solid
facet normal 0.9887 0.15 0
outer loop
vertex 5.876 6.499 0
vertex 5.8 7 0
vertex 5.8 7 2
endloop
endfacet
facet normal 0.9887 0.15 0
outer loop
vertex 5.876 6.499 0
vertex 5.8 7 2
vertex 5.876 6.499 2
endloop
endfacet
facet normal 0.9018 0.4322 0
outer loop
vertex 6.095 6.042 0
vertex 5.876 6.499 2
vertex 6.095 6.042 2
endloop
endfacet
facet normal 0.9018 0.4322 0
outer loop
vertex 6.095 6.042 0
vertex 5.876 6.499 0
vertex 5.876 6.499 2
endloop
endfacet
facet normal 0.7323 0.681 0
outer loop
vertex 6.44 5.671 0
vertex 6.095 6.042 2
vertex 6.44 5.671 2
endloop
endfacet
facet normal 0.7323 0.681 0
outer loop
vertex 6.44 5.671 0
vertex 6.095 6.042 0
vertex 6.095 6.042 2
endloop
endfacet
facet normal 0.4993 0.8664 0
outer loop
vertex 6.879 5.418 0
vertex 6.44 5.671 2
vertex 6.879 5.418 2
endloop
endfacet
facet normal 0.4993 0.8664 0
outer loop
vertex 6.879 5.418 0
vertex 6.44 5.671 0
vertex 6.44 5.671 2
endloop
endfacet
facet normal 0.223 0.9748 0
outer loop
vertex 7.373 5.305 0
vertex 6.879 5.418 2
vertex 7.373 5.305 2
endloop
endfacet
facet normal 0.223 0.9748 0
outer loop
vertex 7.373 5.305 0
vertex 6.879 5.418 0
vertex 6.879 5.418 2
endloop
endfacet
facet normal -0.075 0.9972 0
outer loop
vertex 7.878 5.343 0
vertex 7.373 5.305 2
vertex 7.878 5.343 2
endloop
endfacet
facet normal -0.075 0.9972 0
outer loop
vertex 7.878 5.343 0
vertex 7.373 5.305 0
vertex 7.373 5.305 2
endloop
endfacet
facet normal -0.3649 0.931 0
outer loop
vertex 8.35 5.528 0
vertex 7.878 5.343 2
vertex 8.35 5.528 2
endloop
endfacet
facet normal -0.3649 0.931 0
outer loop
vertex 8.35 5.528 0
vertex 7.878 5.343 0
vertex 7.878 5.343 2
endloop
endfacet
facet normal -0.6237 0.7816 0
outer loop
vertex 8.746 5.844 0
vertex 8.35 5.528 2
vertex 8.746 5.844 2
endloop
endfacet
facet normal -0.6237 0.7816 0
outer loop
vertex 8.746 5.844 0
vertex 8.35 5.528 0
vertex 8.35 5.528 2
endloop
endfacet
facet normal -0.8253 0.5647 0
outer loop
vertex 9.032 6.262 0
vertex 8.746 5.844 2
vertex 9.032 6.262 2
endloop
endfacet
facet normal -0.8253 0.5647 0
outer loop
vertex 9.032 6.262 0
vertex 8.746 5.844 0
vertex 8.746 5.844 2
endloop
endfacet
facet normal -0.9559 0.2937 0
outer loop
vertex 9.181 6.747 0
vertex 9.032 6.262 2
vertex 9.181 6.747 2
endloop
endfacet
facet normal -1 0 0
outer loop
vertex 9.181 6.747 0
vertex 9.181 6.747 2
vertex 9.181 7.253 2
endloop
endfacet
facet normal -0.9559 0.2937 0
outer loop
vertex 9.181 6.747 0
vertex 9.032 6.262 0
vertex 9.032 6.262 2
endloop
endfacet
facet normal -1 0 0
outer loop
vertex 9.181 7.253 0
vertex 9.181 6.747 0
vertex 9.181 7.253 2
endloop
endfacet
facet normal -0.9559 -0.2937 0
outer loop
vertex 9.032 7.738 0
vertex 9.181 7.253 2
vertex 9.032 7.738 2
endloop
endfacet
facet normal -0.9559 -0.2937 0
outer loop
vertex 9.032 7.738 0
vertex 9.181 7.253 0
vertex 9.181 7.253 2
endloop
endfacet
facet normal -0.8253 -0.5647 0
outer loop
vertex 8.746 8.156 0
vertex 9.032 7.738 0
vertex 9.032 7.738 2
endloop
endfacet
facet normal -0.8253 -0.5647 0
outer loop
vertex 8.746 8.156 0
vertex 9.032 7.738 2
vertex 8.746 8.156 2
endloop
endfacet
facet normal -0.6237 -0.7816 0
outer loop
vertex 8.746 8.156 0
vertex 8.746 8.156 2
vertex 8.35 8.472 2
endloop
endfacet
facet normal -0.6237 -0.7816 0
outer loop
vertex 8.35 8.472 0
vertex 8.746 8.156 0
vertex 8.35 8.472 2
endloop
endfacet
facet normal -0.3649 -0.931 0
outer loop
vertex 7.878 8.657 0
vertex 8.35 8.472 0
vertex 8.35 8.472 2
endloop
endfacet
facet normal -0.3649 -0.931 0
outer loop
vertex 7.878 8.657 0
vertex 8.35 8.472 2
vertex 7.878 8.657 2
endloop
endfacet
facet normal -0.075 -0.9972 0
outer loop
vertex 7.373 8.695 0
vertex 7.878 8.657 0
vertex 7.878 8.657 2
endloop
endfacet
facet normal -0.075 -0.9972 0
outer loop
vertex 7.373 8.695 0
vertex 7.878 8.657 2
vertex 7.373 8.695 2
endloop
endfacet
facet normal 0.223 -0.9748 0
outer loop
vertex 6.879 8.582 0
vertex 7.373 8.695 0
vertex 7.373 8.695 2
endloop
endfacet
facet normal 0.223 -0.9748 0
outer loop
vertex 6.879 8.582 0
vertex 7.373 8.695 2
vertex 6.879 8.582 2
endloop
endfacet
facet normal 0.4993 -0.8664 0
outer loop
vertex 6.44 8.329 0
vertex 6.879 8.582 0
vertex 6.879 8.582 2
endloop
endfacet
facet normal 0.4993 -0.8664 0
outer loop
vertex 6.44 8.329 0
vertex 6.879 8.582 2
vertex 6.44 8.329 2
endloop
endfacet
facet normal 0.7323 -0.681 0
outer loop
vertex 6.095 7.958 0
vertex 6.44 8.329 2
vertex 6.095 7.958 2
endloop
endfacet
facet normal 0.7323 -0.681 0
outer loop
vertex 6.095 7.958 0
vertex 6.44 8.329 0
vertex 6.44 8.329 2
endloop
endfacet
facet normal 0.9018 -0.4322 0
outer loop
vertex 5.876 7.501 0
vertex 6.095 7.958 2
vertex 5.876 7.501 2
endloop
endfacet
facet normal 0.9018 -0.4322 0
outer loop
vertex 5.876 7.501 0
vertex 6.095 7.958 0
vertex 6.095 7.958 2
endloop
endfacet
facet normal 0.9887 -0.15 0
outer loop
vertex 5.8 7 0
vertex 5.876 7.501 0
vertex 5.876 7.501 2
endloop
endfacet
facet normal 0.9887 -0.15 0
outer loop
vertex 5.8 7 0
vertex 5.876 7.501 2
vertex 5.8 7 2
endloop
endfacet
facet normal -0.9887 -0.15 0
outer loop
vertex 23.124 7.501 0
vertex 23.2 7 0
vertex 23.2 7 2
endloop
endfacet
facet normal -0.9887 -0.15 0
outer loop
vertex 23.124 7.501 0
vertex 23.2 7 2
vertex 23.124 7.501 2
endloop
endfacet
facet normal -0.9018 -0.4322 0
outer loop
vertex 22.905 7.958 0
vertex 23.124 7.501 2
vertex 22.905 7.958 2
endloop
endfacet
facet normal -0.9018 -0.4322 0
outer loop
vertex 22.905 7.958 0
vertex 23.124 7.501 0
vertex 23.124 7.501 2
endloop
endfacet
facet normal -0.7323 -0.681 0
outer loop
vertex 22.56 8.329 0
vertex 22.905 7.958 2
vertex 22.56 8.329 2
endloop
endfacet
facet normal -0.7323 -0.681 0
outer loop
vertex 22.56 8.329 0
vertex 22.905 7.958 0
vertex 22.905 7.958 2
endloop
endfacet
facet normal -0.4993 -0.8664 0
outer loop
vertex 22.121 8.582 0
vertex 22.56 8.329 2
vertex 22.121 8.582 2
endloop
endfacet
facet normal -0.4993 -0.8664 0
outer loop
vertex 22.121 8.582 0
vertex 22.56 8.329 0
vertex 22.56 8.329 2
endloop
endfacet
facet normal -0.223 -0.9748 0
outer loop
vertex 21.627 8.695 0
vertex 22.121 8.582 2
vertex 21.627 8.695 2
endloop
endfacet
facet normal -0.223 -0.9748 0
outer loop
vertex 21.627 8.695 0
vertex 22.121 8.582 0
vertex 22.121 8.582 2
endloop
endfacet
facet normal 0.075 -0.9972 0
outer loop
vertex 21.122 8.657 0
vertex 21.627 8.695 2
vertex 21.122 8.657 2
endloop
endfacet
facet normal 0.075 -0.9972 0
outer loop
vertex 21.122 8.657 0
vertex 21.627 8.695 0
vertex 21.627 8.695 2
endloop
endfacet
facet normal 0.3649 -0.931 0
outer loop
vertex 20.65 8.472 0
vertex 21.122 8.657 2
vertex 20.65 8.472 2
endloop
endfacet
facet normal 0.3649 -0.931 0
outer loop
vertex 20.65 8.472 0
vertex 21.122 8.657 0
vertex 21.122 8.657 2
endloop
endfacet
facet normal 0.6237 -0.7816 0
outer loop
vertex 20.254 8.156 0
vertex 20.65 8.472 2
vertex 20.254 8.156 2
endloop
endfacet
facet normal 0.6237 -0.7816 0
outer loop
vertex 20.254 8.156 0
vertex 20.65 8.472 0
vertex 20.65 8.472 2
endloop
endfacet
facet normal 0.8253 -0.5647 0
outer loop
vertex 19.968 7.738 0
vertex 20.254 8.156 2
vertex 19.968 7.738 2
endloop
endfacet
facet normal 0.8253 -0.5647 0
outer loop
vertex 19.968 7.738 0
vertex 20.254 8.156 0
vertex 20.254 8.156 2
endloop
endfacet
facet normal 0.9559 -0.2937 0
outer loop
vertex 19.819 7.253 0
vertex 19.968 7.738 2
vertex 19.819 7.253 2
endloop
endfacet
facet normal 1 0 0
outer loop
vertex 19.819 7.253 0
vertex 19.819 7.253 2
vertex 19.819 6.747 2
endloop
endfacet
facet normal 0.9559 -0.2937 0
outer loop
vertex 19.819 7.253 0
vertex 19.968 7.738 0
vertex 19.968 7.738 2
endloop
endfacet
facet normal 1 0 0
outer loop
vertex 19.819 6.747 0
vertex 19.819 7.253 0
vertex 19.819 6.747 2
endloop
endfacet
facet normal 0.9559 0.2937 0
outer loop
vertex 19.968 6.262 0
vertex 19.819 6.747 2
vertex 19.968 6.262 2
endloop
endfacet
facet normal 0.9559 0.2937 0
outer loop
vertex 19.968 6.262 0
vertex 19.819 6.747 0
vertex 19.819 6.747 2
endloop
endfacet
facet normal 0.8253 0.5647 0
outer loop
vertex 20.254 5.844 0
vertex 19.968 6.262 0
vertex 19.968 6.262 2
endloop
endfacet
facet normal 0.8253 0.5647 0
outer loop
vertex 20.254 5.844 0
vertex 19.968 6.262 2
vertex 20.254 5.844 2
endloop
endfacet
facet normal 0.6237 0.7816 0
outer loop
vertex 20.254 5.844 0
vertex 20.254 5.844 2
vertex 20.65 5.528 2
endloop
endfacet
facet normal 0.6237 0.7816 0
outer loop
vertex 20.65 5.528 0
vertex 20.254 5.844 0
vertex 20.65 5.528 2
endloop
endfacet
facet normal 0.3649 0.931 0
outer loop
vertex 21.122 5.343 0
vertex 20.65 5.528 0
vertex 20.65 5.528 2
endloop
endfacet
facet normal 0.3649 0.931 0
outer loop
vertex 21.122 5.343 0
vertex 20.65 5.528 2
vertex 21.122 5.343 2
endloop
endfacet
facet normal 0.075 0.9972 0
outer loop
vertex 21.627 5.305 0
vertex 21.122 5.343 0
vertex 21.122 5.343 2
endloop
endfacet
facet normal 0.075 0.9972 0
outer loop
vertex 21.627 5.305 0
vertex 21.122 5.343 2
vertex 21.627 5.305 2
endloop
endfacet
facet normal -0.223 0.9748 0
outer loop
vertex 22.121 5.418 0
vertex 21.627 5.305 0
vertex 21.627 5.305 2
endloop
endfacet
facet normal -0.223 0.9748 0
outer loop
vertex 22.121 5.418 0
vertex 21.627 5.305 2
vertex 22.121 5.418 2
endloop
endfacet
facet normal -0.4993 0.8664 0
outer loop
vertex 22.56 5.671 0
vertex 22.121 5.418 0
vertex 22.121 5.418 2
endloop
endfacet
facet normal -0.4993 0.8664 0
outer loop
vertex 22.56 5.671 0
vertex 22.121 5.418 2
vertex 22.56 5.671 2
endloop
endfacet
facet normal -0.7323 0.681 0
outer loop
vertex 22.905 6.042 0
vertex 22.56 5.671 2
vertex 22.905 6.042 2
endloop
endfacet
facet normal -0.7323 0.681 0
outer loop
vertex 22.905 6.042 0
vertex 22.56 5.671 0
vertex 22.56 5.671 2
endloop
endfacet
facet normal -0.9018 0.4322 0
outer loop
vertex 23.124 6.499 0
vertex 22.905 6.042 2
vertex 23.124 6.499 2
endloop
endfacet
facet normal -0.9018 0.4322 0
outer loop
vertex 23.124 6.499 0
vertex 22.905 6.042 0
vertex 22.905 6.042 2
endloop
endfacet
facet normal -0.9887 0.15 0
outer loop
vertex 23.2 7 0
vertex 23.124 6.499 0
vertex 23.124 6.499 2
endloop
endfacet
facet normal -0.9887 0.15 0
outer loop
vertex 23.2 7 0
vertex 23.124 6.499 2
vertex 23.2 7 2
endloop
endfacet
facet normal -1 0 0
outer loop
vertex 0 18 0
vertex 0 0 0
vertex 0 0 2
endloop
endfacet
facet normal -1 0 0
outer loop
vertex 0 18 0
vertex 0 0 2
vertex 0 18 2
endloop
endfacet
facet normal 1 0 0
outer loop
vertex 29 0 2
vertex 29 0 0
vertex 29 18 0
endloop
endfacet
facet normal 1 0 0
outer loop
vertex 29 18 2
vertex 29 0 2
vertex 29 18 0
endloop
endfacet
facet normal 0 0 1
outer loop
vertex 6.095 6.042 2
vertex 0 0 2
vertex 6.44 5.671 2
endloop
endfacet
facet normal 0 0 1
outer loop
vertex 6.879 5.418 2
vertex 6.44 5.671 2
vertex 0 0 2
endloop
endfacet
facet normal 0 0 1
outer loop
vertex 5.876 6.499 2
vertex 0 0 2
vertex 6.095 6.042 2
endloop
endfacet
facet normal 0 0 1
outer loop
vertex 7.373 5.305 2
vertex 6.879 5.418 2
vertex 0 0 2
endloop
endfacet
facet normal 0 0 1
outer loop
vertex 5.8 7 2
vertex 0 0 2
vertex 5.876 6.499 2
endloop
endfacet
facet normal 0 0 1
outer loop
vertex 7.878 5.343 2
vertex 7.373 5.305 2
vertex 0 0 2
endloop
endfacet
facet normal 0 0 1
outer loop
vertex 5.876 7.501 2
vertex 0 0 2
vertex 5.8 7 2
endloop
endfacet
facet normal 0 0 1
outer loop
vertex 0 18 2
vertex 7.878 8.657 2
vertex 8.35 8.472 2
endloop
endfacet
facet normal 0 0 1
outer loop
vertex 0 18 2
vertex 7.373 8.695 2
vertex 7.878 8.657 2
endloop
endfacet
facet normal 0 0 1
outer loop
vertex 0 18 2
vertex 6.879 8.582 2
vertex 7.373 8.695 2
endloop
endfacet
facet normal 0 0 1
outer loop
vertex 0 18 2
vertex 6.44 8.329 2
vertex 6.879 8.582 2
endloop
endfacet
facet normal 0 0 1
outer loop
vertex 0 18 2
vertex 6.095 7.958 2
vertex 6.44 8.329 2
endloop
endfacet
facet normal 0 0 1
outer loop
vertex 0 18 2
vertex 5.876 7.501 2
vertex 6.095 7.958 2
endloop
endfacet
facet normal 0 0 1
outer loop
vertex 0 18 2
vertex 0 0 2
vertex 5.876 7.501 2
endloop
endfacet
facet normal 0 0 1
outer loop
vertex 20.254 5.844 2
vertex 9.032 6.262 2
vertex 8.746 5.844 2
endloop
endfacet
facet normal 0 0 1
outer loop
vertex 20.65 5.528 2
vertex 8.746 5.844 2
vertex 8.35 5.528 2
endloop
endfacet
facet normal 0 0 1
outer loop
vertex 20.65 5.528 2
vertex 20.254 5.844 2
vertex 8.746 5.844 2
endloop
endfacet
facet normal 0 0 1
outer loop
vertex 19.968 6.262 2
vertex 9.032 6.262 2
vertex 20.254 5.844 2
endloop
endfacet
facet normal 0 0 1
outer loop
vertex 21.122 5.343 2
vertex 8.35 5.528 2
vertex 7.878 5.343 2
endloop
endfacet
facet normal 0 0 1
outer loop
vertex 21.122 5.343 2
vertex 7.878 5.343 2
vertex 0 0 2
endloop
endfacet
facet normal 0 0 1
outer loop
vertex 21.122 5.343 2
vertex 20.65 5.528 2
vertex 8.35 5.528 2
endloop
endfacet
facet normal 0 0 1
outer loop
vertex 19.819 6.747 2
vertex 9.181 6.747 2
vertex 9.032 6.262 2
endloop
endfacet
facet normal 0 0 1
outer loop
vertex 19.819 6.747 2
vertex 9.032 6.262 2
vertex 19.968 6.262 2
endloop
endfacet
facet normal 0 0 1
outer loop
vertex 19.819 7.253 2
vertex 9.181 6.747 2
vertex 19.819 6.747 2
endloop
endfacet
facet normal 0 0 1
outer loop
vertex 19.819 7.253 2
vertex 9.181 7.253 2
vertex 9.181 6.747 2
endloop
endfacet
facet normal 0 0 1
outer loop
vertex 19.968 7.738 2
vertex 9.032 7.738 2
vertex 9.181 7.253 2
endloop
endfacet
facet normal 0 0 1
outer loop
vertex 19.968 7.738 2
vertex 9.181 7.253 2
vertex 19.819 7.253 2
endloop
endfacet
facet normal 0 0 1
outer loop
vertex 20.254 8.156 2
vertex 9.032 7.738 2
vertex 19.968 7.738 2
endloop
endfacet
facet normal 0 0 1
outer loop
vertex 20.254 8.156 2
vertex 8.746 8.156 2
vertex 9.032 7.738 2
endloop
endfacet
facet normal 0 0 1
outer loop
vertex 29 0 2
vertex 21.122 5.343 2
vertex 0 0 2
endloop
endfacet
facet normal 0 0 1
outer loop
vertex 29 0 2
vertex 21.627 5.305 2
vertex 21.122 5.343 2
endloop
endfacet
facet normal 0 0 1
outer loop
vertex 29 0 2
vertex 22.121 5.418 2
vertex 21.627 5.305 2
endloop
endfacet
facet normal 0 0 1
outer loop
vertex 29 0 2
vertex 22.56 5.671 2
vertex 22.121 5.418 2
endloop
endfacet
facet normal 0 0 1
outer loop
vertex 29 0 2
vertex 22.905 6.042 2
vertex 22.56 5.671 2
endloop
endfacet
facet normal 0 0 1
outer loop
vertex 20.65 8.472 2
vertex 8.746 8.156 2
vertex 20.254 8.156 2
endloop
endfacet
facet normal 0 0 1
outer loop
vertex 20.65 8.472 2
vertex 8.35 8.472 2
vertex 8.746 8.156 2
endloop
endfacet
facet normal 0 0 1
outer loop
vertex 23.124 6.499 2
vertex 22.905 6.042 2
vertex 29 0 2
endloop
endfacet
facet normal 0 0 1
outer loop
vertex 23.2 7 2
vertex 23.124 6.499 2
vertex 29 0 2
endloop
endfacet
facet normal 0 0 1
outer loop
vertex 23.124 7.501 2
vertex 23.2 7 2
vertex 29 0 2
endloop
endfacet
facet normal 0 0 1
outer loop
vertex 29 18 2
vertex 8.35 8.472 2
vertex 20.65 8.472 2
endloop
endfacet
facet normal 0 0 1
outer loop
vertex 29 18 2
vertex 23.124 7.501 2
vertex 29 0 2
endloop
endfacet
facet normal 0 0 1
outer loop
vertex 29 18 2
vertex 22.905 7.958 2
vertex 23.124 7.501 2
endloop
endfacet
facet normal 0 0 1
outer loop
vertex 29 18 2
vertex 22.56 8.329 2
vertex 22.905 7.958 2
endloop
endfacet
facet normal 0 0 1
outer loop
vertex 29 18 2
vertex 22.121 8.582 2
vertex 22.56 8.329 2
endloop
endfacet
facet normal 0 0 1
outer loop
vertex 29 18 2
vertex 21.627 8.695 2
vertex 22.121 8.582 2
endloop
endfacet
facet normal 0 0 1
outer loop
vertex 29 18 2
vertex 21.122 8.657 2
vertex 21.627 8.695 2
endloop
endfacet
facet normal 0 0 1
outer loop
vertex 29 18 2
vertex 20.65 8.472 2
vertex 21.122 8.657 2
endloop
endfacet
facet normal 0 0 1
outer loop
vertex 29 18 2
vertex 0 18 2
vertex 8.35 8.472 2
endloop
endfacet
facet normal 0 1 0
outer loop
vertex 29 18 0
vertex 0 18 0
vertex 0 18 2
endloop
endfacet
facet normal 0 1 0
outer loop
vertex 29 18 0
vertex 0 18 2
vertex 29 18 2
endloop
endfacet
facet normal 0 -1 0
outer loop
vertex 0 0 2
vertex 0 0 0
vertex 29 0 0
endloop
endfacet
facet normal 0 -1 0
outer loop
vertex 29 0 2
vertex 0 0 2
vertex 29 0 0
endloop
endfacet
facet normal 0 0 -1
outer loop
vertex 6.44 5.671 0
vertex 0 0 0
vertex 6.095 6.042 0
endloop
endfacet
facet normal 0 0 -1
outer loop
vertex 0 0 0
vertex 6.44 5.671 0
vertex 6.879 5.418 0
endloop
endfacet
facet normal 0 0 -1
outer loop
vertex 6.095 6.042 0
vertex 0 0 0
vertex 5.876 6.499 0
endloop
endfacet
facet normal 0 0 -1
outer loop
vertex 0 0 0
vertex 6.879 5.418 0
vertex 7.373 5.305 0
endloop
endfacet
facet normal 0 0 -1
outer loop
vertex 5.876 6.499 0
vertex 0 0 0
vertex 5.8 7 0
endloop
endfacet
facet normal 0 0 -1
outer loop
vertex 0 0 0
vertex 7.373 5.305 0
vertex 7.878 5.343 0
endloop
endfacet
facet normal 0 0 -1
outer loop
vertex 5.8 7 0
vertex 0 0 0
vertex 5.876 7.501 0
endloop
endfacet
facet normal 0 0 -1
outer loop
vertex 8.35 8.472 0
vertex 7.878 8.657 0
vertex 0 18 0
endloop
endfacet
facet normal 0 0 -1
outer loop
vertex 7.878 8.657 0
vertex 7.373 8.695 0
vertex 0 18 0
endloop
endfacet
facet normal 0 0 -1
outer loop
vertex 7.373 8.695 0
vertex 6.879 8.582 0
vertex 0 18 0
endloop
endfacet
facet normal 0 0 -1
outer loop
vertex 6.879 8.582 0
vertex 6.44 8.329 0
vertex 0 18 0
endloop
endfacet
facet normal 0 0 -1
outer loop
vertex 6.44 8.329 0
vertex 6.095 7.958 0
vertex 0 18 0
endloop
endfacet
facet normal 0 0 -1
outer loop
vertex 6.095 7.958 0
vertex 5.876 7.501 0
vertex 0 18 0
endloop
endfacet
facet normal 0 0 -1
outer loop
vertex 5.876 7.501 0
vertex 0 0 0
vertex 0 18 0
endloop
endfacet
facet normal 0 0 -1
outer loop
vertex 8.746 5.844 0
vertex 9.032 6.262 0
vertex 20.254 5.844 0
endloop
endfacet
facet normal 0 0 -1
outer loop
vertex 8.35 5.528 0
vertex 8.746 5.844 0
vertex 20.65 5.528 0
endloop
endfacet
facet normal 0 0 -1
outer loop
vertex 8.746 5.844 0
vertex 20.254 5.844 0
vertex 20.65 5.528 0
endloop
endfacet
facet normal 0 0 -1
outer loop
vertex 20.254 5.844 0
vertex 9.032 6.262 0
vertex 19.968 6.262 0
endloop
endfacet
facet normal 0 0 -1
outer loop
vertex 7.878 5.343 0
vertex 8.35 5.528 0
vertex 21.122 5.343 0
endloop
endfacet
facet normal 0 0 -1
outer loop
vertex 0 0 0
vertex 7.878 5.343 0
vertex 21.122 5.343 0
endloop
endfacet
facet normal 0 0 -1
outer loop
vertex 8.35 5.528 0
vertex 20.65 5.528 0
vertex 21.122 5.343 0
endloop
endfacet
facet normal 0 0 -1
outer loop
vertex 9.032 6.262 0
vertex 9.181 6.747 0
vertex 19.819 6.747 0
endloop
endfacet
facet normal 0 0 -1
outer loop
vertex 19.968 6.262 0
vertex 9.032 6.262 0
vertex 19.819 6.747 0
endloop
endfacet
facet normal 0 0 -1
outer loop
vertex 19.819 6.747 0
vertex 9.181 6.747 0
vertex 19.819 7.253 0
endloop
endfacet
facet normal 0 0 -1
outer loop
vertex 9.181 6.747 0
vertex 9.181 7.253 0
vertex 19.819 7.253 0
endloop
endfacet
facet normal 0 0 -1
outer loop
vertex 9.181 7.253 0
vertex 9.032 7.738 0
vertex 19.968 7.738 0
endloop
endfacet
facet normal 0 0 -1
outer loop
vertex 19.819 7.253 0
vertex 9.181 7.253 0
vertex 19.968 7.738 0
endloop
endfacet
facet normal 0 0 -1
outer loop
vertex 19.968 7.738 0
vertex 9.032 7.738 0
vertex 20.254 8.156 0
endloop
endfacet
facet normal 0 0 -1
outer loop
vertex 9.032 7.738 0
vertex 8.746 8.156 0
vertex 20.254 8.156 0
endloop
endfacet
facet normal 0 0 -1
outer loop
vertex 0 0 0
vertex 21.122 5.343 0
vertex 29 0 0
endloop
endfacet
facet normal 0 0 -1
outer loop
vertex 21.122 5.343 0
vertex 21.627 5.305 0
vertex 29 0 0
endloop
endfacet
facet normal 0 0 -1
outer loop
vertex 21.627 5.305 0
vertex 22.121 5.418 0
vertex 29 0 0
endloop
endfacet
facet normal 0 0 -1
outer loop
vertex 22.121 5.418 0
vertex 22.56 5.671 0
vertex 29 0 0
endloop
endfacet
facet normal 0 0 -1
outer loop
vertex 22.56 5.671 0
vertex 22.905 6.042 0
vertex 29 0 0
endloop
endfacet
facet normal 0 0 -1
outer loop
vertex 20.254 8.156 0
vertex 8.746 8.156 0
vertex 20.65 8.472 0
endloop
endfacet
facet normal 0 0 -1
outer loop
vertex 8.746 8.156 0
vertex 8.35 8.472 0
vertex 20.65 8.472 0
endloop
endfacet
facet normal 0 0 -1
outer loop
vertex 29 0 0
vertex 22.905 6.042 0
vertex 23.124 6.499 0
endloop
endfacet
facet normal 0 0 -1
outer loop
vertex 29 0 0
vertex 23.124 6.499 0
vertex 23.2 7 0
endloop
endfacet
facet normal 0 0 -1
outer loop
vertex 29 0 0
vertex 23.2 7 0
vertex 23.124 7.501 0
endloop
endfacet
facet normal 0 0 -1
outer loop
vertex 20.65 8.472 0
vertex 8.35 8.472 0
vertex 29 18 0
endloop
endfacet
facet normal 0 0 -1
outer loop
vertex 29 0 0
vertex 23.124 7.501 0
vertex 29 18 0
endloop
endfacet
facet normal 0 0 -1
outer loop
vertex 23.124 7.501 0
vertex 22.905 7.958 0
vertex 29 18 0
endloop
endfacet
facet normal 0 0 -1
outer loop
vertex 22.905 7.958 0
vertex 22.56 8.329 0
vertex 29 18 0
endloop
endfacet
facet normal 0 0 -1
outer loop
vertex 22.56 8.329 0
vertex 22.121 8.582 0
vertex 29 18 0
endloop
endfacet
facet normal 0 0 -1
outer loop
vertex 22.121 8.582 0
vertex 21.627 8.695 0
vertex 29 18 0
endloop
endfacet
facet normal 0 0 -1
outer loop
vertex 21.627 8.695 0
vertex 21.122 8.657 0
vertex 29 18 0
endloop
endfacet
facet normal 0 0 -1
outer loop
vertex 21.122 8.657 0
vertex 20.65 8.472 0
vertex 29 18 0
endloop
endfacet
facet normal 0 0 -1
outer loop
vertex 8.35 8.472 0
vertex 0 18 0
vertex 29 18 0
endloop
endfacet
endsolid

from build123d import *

# Parameters (mm, degrees)
SKETCH_1_W      = 29
SKETCH_1_H      = 18
SKETCH_1_R      = 1.7
EXTRUDE_1_DEPTH = 2


with BuildPart() as part:
    # 草图1 → 凸台-拉伸1 (new body)
    with BuildSketch(Plane.XY):
        with Locations((14.5, 9)):
            Rectangle(SKETCH_1_W, SKETCH_1_H)
        with Locations((21.5, 7)):
            Circle(SKETCH_1_R, mode=Mode.SUBTRACT)
        with Locations(Location((7.5, 7, 0), (0, 0, 180))):
            Circle(SKETCH_1_R, mode=Mode.SUBTRACT)
    extrude(amount=EXTRUDE_1_DEPTH)


solid = part.part
